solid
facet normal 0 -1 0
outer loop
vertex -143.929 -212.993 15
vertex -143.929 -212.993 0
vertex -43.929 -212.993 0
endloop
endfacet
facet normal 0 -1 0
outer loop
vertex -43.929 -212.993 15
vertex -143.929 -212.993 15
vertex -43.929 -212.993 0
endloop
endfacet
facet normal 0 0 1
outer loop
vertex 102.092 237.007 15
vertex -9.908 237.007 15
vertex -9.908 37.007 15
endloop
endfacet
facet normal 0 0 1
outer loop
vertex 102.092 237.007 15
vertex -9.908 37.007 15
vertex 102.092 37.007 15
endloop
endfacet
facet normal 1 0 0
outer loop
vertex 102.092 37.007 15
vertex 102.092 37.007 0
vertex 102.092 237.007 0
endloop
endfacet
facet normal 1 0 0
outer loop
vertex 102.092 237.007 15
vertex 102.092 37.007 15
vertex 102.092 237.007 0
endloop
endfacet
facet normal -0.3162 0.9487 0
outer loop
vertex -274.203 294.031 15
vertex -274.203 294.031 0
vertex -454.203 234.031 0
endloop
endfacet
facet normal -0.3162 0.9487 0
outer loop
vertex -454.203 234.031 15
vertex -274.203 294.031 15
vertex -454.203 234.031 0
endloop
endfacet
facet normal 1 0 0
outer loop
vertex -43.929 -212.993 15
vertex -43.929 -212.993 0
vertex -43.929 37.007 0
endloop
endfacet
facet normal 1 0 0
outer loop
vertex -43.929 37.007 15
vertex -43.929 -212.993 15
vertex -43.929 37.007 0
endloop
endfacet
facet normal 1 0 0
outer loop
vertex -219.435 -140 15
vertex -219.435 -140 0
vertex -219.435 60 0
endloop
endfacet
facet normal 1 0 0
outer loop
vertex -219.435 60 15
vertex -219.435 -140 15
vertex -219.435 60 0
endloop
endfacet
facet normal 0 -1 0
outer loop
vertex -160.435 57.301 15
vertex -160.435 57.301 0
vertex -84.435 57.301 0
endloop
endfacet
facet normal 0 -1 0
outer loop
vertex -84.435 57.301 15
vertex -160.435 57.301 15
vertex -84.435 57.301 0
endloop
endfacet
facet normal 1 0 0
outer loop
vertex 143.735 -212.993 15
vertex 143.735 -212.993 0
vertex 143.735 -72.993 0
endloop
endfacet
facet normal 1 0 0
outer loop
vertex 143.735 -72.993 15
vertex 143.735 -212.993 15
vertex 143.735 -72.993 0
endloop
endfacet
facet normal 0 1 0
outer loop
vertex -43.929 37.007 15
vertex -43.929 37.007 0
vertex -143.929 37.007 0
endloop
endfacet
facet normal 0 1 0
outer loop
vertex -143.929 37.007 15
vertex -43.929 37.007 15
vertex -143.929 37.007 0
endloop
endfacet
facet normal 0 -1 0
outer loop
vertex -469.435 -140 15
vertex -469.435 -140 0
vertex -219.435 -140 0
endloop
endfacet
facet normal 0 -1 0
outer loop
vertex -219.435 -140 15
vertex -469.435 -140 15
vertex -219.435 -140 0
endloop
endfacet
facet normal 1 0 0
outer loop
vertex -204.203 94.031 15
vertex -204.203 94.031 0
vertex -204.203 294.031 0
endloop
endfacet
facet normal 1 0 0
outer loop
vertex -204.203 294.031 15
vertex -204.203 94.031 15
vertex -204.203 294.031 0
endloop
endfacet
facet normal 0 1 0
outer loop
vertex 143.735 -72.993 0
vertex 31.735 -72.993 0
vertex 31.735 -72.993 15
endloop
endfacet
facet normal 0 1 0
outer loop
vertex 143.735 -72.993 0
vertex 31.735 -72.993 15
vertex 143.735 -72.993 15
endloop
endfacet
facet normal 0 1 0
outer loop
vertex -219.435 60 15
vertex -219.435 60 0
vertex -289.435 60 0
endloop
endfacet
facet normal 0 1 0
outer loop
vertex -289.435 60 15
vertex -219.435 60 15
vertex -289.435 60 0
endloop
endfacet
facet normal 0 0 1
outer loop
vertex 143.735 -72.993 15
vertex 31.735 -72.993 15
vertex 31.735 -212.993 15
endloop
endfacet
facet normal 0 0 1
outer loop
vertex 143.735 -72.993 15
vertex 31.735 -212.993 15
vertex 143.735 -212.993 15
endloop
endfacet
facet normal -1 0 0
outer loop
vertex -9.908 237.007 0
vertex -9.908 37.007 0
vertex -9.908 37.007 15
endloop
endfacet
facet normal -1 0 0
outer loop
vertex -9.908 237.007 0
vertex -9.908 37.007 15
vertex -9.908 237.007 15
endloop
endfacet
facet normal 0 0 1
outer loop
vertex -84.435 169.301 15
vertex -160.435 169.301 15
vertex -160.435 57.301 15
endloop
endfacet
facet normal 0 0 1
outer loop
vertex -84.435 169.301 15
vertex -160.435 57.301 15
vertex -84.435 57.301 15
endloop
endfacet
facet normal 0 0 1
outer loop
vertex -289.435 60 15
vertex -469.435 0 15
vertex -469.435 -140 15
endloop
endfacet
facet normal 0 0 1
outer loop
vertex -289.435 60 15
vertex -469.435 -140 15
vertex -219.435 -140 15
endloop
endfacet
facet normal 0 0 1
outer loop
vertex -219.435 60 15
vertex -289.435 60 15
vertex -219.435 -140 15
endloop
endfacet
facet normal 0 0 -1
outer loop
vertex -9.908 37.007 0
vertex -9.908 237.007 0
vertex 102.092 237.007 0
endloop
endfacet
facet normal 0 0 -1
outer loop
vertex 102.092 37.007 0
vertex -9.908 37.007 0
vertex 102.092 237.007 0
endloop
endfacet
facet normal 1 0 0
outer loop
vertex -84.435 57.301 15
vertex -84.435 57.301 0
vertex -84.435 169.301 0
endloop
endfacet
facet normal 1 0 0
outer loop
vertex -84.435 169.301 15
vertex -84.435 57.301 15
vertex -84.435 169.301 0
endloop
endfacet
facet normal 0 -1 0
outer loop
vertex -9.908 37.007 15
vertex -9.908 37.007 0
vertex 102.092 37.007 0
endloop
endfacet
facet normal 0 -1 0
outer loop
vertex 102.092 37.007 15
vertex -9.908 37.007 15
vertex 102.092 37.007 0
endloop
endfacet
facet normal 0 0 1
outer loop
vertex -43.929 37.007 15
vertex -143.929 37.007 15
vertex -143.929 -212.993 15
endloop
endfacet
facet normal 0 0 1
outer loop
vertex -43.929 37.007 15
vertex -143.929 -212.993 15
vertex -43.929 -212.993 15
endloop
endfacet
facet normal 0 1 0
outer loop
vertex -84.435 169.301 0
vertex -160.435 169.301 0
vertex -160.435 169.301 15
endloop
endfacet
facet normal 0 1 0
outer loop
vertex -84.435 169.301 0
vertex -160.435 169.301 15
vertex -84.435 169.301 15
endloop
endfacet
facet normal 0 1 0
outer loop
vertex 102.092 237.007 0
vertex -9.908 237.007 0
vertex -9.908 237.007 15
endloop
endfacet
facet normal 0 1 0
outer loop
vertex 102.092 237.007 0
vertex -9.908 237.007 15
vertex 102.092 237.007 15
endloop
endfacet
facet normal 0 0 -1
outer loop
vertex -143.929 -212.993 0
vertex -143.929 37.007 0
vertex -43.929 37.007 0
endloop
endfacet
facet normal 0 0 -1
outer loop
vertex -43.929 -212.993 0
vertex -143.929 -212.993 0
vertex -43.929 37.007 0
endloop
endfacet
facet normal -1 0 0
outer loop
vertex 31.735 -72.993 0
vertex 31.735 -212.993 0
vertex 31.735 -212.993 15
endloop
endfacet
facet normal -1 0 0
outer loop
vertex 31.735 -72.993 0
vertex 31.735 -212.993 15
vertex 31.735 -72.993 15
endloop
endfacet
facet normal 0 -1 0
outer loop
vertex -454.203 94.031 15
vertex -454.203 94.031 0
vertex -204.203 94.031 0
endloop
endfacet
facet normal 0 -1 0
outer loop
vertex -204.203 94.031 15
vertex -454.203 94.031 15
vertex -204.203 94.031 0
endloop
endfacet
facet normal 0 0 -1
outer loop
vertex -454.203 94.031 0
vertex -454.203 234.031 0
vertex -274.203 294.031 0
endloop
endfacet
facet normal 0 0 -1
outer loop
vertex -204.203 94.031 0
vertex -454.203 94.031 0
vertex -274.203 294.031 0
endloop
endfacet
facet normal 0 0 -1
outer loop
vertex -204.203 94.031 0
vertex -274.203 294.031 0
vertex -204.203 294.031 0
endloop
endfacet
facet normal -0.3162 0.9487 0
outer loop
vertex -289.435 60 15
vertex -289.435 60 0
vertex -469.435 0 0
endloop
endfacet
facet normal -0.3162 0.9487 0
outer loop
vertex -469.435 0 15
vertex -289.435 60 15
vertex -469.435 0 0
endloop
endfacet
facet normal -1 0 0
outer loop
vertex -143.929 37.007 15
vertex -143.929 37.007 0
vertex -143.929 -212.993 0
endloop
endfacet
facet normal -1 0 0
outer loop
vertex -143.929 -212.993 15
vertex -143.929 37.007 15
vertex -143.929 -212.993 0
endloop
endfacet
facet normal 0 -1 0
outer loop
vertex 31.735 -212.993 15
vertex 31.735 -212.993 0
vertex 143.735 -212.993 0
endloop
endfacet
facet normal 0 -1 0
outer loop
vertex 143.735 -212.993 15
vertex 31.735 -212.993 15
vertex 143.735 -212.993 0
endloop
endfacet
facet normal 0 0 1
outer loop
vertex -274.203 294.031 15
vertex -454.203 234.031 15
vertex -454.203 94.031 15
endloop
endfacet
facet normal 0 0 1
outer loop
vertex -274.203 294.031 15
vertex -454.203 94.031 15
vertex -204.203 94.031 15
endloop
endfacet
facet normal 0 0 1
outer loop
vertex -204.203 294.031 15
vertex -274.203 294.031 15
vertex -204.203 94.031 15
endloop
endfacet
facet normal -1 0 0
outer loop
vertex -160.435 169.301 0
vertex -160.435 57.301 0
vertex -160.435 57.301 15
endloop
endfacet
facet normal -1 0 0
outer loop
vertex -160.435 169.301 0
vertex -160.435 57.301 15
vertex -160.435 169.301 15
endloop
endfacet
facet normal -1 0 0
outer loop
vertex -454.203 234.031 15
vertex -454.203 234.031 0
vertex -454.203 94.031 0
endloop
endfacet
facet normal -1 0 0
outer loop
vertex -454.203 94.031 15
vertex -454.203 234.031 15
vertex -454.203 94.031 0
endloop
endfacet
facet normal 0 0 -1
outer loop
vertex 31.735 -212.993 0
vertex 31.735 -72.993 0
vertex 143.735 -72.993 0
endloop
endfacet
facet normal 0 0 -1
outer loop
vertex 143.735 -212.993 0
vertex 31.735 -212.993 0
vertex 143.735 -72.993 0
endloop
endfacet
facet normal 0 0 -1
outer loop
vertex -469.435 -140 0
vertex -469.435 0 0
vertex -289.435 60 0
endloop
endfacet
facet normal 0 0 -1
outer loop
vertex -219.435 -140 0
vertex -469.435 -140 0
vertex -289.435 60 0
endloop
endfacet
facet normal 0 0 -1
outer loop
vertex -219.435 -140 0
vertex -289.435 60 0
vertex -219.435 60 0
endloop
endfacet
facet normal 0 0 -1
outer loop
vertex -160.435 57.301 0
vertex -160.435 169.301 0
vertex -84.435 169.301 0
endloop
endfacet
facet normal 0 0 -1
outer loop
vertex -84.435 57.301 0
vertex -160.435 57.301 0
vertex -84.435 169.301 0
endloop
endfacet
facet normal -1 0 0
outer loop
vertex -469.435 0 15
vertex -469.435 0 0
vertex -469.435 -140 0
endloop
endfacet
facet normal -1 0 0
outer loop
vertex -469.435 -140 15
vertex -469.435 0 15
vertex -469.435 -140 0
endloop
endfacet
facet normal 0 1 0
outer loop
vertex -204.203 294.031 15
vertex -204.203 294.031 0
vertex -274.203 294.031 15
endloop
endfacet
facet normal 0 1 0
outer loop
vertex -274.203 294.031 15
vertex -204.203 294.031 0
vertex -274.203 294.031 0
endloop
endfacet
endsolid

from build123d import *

# Parameters (mm, degrees)
F0_W     = 112
F0_H     = 200
F0_H_2   = 140
F0_W_2   = 76
F0_H_3   = 112
F1_DEPTH = 15


with BuildPart() as f1:
    # F0 (on Top) → F1 (new body)
    with BuildSketch(Plane.XY):
        Polygon((-43.929126, 3.552402), (-43.929126, 37.007362), (-143.929126, 37.007362), (-143.929126, -212.992638), (-43.929126, -212.992638), align=None)
        with Locations((46.091541, 137.007362)):
            Rectangle(F0_W, F0_H)
        with Locations((87.735014, -142.992638)):
            Rectangle(F0_W, F0_H_2)
        with Locations((-122.435277, 113.30148)):
            Rectangle(F0_W_2, F0_H_3)
        Polygon((-219.435304, 60), (-289.435304, 60), (-469.435304, 0), (-469.435304, -140), (-219.435304, -140), align=None)
        Polygon((-204.203144, 294.031364), (-274.203144, 294.031364), (-454.203144, 234.031364), (-454.203144, 94.031364), (-204.203144, 94.031364), align=None)
    extrude(amount=F1_DEPTH)


solid = f1.part
